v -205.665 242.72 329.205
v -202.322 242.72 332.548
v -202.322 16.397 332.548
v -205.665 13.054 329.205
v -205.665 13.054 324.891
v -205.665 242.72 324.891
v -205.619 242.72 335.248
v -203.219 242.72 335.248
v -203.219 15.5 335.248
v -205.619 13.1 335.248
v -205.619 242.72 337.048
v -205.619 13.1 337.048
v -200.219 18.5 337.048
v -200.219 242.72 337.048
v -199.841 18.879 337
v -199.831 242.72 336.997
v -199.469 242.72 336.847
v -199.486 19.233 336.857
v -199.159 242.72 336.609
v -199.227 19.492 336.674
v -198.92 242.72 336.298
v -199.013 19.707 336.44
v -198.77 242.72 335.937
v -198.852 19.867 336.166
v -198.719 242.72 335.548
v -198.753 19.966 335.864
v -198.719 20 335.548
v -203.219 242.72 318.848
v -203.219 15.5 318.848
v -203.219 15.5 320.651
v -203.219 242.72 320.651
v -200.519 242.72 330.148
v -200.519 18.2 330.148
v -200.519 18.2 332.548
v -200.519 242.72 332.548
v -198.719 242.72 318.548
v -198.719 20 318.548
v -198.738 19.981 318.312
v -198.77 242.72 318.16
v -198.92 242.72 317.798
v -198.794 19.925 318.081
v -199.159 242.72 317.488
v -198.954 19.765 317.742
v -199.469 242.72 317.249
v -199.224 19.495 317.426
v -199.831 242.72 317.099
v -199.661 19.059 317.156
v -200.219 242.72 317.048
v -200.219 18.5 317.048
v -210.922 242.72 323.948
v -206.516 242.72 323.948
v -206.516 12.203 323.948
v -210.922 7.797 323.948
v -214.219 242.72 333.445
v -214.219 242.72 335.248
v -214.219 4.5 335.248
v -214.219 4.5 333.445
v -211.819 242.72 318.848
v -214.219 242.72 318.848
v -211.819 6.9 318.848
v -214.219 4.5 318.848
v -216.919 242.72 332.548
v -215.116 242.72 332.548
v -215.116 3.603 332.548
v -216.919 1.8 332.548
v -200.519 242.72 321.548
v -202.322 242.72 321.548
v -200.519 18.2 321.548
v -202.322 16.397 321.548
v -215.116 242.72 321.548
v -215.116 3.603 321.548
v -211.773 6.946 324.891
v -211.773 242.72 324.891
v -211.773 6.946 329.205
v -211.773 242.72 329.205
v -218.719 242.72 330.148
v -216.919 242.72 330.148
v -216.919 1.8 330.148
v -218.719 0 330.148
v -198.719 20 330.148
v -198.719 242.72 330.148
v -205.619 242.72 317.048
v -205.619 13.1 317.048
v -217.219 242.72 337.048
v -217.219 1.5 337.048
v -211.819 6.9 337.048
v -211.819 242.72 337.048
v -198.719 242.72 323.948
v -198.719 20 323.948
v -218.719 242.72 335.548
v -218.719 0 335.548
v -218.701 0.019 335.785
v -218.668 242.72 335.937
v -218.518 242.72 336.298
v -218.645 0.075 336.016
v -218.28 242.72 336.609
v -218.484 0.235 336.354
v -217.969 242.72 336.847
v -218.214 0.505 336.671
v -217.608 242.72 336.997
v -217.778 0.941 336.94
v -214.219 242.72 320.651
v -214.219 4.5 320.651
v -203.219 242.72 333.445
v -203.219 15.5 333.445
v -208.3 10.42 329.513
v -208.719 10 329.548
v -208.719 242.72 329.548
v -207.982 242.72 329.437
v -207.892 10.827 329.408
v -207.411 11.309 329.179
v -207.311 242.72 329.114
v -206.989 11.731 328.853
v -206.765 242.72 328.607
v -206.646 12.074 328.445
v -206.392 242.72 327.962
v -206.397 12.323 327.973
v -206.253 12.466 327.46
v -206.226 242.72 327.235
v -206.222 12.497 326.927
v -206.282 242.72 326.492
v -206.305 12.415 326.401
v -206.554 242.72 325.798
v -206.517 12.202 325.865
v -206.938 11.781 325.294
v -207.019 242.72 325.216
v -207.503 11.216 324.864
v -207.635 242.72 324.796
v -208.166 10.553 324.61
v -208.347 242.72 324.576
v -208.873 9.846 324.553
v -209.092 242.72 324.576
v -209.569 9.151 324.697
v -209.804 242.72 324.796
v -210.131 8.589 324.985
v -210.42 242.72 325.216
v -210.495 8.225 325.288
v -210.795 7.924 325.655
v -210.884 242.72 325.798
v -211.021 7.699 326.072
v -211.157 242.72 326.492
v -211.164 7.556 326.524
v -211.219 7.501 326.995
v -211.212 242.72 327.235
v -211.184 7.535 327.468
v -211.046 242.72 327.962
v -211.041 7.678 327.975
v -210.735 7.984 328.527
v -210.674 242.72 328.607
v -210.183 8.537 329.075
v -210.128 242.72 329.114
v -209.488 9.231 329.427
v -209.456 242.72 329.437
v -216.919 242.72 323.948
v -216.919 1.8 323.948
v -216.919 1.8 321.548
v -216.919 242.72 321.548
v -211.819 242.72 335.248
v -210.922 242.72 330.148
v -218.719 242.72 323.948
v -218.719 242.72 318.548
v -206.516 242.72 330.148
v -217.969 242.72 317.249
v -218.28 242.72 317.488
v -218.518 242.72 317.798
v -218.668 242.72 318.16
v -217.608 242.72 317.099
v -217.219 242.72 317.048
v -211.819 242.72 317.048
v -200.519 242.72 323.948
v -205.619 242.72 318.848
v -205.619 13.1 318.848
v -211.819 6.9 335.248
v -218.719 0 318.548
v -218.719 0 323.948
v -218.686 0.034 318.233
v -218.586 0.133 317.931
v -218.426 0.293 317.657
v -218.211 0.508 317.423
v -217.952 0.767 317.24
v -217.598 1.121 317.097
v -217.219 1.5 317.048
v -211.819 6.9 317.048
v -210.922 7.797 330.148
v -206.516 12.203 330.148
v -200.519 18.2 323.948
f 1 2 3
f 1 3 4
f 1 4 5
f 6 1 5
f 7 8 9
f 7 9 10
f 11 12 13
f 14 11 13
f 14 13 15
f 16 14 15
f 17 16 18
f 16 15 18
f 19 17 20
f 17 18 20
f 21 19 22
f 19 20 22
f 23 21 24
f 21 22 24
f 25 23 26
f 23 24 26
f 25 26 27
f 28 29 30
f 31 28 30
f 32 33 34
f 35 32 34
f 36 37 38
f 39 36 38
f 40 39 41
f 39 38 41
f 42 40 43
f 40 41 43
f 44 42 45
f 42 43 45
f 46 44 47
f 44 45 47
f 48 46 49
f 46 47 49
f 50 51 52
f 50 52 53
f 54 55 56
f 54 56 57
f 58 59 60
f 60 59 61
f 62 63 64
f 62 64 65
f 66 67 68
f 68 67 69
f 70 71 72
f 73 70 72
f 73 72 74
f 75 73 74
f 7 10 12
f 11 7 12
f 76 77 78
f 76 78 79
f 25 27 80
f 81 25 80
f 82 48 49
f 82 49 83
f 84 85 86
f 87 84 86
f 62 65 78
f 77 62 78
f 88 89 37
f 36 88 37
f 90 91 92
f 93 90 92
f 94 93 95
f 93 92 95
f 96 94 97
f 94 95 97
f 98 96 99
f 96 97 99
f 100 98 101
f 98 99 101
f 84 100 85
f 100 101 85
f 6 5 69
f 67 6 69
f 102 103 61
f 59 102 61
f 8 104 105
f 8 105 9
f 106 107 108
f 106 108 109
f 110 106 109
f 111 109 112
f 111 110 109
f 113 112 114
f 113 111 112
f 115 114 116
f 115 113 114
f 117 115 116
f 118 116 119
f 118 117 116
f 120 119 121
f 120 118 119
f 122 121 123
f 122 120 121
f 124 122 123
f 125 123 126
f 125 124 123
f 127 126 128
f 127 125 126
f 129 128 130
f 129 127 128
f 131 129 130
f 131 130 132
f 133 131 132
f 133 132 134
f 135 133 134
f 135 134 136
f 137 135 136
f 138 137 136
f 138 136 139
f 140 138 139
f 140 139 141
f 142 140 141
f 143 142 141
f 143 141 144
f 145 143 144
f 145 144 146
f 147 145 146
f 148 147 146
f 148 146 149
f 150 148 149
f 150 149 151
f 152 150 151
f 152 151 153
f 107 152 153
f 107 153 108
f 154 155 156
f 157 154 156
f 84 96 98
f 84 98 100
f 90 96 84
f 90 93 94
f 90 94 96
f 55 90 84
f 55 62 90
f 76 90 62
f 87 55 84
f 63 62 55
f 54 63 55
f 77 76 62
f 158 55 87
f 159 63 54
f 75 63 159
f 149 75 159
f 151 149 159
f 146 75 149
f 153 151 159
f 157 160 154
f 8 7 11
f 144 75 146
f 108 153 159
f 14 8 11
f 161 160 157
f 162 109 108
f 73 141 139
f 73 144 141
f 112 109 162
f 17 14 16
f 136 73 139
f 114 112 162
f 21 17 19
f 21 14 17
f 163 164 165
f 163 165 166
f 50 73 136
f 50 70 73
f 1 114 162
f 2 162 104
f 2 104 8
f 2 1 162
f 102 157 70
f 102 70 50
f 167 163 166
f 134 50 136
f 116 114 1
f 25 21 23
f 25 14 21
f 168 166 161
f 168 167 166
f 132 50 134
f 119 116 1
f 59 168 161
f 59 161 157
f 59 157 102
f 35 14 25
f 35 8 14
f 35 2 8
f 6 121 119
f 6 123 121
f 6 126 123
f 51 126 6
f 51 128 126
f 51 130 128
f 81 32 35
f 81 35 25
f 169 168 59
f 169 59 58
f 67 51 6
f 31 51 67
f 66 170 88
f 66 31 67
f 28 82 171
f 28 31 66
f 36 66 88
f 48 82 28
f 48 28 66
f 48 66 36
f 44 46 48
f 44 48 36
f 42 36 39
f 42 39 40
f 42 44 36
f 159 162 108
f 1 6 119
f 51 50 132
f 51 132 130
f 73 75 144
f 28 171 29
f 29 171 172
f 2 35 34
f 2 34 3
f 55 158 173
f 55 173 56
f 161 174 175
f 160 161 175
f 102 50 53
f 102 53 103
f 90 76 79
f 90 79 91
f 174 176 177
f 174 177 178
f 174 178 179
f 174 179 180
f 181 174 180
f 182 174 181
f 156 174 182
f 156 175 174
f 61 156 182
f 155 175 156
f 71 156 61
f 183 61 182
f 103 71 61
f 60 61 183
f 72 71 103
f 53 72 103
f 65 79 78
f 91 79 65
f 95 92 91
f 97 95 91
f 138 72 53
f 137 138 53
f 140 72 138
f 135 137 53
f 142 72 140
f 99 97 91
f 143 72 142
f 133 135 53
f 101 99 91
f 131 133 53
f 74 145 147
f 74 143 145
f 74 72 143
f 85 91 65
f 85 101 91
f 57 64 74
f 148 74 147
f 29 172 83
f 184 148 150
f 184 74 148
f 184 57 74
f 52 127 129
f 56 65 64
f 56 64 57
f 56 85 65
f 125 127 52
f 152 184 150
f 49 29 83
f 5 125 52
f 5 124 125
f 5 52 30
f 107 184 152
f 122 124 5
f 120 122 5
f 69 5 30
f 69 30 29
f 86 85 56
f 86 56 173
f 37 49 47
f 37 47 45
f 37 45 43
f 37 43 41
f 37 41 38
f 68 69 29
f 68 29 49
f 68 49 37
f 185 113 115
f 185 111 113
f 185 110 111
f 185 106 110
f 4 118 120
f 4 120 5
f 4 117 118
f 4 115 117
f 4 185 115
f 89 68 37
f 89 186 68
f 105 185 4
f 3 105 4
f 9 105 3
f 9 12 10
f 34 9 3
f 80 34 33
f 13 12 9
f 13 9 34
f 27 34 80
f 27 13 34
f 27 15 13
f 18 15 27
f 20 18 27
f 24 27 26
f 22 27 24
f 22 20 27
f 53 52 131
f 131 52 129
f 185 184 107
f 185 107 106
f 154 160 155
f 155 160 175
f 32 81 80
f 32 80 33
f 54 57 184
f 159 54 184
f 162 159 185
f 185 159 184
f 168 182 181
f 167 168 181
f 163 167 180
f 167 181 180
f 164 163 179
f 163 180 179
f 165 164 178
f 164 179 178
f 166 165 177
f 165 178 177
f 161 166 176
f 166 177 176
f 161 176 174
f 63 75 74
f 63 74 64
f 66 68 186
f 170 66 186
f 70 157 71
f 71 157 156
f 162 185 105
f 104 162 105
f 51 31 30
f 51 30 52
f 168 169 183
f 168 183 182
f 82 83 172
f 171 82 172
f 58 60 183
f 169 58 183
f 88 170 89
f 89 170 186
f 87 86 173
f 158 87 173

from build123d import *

# Parameters (mm, degrees)
SKETCH_1_R          = 2.5
EXTRUDE_1_DEPTH     = 242.72
CUT_EXTRUDE_1_DEPTH = 328.339480429


with BuildPart() as part:
    # 草图1 → 凸台-拉伸1 (new body)
    with BuildSketch(Plane(origin=(0, 0, 0), x_dir=(1, 0, 0), z_dir=(0, 1, 0))):
        with BuildLine():
            Line((-216.919311098, -330.148369359), (-218.719311098, -330.148369359))
            Line((-218.719311098, -330.148369359), (-218.719311098, -335.548369359))
            ThreePointArc((-218.719311098, -335.548369359), (-218.27997127, -336.60902953), (-217.219311098, -337.048369359))
            Line((-217.219311098, -337.048369359), (-211.819311098, -337.048369359))
            Line((-211.819311098, -337.048369359), (-211.819311098, -335.248369359))
            Line((-211.819311098, -335.248369359), (-214.219311098, -335.248369359))
            Line((-214.219311098, -335.248369359), (-214.219311098, -333.445419514))
            Line((-214.219311098, -333.445419514), (-210.922260943, -330.148369359))
            Line((-210.922260943, -330.148369359), (-206.516361253, -330.148369359))
            Line((-206.516361253, -330.148369359), (-203.219311098, -333.445419514))
            Line((-203.219311098, -333.445419514), (-203.219311098, -335.248369359))
            Line((-203.219311098, -335.248369359), (-205.619311098, -335.248369359))
            Line((-205.619311098, -335.248369359), (-205.619311098, -337.048369359))
            Line((-205.619311098, -337.048369359), (-200.219311098, -337.048369359))
            ThreePointArc((-200.219311098, -337.048369359), (-199.158650926, -336.60902953), (-198.719311098, -335.548369359))
            Line((-198.719311098, -335.548369359), (-198.719311098, -330.148369359))
            Line((-198.719311098, -330.148369359), (-200.519311098, -330.148369359))
            Line((-200.519311098, -330.148369359), (-200.519311098, -332.548369359))
            Line((-200.519311098, -332.548369359), (-202.322260943, -332.548369359))
            Line((-202.322260943, -332.548369359), (-205.665184078, -329.205446224))
            Line((-205.665184078, -329.205446224), (-205.665184078, -324.891292493))
            Line((-205.665184078, -324.891292493), (-202.322260943, -321.548369359))
            Line((-202.322260943, -321.548369359), (-200.519311098, -321.548369359))
            Line((-200.519311098, -321.548369359), (-200.519311098, -323.948369359))
            Line((-200.519311098, -323.948369359), (-198.719311098, -323.948369359))
            Line((-198.719311098, -323.948369359), (-198.719311098, -318.548369359))
            ThreePointArc((-198.719311098, -318.548369359), (-199.158650926, -317.487709187), (-200.219311098, -317.048369359))
            Line((-200.219311098, -317.048369359), (-205.619311098, -317.048369359))
            Line((-205.619311098, -317.048369359), (-205.619311098, -318.848369359))
            Line((-205.619311098, -318.848369359), (-203.219311098, -318.848369359))
            Line((-203.219311098, -318.848369359), (-203.219311098, -320.651319203))
            Line((-203.219311098, -320.651319203), (-206.516361253, -323.948369359))
            Line((-206.516361253, -323.948369359), (-210.922260943, -323.948369359))
            Line((-210.922260943, -323.948369359), (-214.219311098, -320.651319203))
            Line((-214.219311098, -320.651319203), (-214.219311098, -318.848369359))
            Line((-214.219311098, -318.848369359), (-211.819311098, -318.848369359))
            Line((-211.819311098, -318.848369359), (-211.819311098, -317.048369359))
            Line((-211.819311098, -317.048369359), (-217.219311098, -317.048369359))
            ThreePointArc((-217.219311098, -317.048369359), (-218.27997127, -317.487709187), (-218.719311098, -318.548369359))
            Line((-218.719311098, -318.548369359), (-218.719311098, -323.948369359))
            Line((-218.719311098, -323.948369359), (-216.919311098, -323.948369359))
            Line((-216.919311098, -323.948369359), (-216.919311098, -321.548369359))
            Line((-216.919311098, -321.548369359), (-215.116361253, -321.548369359))
            Line((-215.116361253, -321.548369359), (-211.773438118, -324.891292493))
            Line((-211.773438118, -324.891292493), (-211.773438118, -329.205446224))
            Line((-211.773438118, -329.205446224), (-215.116361253, -332.548369359))
            Line((-215.116361253, -332.548369359), (-216.919311098, -332.548369359))
            Line((-216.919311098, -332.548369359), (-216.919311098, -330.148369359))
        make_face()
        with Locations(Location((-208.719311098, -327.048369359, 0), (0, 0, 270))):
            Circle(SKETCH_1_R, mode=Mode.SUBTRACT)
    extrude(amount=EXTRUDE_1_DEPTH)

    # 草图2 → 切除-拉伸1 (cut, through all)
    with BuildSketch(Plane.XY.offset(337.048369359)):
        Polygon((-218.719311098, 0), (-198.719311098, 20), (-198.719311098, 0), align=None)
    extrude(amount=-CUT_EXTRUDE_1_DEPTH, mode=Mode.SUBTRACT)


solid = part.part
